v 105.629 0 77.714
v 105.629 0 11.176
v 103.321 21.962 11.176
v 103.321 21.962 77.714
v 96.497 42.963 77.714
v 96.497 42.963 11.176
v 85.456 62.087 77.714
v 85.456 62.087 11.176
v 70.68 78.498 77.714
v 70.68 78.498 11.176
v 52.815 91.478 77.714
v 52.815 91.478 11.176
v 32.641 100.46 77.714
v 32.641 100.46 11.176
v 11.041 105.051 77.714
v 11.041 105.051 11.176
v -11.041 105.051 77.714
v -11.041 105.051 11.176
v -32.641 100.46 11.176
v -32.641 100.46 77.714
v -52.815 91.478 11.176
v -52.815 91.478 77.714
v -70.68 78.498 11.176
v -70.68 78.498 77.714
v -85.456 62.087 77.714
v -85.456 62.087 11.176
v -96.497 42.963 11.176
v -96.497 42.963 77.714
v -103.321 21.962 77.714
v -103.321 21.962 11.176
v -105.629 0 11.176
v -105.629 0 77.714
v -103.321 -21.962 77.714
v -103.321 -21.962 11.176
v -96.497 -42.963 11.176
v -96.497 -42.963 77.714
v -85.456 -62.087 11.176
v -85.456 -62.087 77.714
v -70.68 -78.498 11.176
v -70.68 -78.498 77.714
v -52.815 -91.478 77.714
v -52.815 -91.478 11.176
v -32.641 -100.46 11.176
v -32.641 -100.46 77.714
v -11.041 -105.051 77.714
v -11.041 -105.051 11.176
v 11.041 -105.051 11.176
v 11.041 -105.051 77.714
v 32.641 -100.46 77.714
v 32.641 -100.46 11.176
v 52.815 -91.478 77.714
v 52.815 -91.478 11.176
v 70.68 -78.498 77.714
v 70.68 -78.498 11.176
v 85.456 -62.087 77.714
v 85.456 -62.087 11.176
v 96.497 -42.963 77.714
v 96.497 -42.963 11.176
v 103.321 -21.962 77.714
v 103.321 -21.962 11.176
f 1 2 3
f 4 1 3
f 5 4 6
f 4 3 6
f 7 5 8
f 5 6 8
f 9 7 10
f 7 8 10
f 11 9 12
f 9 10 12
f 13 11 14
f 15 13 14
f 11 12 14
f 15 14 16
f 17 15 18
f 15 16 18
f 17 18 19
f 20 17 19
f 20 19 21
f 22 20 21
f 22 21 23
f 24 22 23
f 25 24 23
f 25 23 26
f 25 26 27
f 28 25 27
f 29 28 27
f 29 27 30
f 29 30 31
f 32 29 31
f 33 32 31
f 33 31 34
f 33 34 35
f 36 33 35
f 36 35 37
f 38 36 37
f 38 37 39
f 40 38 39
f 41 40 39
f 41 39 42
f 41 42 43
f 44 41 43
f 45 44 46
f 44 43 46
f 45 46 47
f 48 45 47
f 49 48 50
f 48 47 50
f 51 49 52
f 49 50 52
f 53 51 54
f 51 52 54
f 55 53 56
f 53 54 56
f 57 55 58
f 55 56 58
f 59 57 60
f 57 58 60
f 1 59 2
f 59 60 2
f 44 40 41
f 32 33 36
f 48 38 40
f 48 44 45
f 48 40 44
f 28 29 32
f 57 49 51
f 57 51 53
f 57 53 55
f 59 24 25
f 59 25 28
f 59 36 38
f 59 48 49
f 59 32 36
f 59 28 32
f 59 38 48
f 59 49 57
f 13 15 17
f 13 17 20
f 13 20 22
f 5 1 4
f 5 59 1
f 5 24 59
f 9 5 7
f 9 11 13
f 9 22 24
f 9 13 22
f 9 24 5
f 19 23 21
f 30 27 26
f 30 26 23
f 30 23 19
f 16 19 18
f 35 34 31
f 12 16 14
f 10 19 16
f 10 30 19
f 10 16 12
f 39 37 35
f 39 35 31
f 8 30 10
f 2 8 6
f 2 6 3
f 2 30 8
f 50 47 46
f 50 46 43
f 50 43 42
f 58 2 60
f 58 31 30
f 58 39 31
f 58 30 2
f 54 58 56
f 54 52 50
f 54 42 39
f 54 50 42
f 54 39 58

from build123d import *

# Parameters (mm, degrees)
F0_R     = 127
F1_DEPTH = 80
F2_R     = 105.6868422046
F3_DEPTH = 69.596
F4_R     = 105.629442308
F5_DEPTH = 67.31
F6_R     = 127
F6_R_2   = 105.6868422046
F7_DEPTH = 109.474
F8_R     = 105.6868422046
F9_DEPTH = 11.176


with BuildPart() as f1:
    # F0 (on Top) → F1 (new body)
    with BuildSketch(Plane.XY):
        Circle(F0_R)
    extrude(amount=F1_DEPTH)

    # F2 (on face) → F3 (cut)
    with BuildSketch(Plane.XY.offset(80)):
        Circle(F2_R)
    extrude(amount=-F3_DEPTH, mode=Mode.SUBTRACT)

    # F4 (on face) → F5 (join)
    with BuildSketch(Plane.XY.offset(10.404)):
        Circle(F4_R)
    extrude(amount=F5_DEPTH)

    # F6 (on face) → F7 (cut)
    with BuildSketch(Plane.XY.offset(80)):
        Circle(F6_R)
        Circle(F6_R_2, mode=Mode.SUBTRACT)
    extrude(amount=-F7_DEPTH, mode=Mode.SUBTRACT)

    # F8 (on face) → F9 (cut)
    with BuildSketch(Plane(origin=(0, 0, 0), x_dir=(1, 0, 0), z_dir=(0, 0, -1))):
        Circle(F8_R)
    extrude(amount=-F9_DEPTH, mode=Mode.SUBTRACT)


solid = f1.part
